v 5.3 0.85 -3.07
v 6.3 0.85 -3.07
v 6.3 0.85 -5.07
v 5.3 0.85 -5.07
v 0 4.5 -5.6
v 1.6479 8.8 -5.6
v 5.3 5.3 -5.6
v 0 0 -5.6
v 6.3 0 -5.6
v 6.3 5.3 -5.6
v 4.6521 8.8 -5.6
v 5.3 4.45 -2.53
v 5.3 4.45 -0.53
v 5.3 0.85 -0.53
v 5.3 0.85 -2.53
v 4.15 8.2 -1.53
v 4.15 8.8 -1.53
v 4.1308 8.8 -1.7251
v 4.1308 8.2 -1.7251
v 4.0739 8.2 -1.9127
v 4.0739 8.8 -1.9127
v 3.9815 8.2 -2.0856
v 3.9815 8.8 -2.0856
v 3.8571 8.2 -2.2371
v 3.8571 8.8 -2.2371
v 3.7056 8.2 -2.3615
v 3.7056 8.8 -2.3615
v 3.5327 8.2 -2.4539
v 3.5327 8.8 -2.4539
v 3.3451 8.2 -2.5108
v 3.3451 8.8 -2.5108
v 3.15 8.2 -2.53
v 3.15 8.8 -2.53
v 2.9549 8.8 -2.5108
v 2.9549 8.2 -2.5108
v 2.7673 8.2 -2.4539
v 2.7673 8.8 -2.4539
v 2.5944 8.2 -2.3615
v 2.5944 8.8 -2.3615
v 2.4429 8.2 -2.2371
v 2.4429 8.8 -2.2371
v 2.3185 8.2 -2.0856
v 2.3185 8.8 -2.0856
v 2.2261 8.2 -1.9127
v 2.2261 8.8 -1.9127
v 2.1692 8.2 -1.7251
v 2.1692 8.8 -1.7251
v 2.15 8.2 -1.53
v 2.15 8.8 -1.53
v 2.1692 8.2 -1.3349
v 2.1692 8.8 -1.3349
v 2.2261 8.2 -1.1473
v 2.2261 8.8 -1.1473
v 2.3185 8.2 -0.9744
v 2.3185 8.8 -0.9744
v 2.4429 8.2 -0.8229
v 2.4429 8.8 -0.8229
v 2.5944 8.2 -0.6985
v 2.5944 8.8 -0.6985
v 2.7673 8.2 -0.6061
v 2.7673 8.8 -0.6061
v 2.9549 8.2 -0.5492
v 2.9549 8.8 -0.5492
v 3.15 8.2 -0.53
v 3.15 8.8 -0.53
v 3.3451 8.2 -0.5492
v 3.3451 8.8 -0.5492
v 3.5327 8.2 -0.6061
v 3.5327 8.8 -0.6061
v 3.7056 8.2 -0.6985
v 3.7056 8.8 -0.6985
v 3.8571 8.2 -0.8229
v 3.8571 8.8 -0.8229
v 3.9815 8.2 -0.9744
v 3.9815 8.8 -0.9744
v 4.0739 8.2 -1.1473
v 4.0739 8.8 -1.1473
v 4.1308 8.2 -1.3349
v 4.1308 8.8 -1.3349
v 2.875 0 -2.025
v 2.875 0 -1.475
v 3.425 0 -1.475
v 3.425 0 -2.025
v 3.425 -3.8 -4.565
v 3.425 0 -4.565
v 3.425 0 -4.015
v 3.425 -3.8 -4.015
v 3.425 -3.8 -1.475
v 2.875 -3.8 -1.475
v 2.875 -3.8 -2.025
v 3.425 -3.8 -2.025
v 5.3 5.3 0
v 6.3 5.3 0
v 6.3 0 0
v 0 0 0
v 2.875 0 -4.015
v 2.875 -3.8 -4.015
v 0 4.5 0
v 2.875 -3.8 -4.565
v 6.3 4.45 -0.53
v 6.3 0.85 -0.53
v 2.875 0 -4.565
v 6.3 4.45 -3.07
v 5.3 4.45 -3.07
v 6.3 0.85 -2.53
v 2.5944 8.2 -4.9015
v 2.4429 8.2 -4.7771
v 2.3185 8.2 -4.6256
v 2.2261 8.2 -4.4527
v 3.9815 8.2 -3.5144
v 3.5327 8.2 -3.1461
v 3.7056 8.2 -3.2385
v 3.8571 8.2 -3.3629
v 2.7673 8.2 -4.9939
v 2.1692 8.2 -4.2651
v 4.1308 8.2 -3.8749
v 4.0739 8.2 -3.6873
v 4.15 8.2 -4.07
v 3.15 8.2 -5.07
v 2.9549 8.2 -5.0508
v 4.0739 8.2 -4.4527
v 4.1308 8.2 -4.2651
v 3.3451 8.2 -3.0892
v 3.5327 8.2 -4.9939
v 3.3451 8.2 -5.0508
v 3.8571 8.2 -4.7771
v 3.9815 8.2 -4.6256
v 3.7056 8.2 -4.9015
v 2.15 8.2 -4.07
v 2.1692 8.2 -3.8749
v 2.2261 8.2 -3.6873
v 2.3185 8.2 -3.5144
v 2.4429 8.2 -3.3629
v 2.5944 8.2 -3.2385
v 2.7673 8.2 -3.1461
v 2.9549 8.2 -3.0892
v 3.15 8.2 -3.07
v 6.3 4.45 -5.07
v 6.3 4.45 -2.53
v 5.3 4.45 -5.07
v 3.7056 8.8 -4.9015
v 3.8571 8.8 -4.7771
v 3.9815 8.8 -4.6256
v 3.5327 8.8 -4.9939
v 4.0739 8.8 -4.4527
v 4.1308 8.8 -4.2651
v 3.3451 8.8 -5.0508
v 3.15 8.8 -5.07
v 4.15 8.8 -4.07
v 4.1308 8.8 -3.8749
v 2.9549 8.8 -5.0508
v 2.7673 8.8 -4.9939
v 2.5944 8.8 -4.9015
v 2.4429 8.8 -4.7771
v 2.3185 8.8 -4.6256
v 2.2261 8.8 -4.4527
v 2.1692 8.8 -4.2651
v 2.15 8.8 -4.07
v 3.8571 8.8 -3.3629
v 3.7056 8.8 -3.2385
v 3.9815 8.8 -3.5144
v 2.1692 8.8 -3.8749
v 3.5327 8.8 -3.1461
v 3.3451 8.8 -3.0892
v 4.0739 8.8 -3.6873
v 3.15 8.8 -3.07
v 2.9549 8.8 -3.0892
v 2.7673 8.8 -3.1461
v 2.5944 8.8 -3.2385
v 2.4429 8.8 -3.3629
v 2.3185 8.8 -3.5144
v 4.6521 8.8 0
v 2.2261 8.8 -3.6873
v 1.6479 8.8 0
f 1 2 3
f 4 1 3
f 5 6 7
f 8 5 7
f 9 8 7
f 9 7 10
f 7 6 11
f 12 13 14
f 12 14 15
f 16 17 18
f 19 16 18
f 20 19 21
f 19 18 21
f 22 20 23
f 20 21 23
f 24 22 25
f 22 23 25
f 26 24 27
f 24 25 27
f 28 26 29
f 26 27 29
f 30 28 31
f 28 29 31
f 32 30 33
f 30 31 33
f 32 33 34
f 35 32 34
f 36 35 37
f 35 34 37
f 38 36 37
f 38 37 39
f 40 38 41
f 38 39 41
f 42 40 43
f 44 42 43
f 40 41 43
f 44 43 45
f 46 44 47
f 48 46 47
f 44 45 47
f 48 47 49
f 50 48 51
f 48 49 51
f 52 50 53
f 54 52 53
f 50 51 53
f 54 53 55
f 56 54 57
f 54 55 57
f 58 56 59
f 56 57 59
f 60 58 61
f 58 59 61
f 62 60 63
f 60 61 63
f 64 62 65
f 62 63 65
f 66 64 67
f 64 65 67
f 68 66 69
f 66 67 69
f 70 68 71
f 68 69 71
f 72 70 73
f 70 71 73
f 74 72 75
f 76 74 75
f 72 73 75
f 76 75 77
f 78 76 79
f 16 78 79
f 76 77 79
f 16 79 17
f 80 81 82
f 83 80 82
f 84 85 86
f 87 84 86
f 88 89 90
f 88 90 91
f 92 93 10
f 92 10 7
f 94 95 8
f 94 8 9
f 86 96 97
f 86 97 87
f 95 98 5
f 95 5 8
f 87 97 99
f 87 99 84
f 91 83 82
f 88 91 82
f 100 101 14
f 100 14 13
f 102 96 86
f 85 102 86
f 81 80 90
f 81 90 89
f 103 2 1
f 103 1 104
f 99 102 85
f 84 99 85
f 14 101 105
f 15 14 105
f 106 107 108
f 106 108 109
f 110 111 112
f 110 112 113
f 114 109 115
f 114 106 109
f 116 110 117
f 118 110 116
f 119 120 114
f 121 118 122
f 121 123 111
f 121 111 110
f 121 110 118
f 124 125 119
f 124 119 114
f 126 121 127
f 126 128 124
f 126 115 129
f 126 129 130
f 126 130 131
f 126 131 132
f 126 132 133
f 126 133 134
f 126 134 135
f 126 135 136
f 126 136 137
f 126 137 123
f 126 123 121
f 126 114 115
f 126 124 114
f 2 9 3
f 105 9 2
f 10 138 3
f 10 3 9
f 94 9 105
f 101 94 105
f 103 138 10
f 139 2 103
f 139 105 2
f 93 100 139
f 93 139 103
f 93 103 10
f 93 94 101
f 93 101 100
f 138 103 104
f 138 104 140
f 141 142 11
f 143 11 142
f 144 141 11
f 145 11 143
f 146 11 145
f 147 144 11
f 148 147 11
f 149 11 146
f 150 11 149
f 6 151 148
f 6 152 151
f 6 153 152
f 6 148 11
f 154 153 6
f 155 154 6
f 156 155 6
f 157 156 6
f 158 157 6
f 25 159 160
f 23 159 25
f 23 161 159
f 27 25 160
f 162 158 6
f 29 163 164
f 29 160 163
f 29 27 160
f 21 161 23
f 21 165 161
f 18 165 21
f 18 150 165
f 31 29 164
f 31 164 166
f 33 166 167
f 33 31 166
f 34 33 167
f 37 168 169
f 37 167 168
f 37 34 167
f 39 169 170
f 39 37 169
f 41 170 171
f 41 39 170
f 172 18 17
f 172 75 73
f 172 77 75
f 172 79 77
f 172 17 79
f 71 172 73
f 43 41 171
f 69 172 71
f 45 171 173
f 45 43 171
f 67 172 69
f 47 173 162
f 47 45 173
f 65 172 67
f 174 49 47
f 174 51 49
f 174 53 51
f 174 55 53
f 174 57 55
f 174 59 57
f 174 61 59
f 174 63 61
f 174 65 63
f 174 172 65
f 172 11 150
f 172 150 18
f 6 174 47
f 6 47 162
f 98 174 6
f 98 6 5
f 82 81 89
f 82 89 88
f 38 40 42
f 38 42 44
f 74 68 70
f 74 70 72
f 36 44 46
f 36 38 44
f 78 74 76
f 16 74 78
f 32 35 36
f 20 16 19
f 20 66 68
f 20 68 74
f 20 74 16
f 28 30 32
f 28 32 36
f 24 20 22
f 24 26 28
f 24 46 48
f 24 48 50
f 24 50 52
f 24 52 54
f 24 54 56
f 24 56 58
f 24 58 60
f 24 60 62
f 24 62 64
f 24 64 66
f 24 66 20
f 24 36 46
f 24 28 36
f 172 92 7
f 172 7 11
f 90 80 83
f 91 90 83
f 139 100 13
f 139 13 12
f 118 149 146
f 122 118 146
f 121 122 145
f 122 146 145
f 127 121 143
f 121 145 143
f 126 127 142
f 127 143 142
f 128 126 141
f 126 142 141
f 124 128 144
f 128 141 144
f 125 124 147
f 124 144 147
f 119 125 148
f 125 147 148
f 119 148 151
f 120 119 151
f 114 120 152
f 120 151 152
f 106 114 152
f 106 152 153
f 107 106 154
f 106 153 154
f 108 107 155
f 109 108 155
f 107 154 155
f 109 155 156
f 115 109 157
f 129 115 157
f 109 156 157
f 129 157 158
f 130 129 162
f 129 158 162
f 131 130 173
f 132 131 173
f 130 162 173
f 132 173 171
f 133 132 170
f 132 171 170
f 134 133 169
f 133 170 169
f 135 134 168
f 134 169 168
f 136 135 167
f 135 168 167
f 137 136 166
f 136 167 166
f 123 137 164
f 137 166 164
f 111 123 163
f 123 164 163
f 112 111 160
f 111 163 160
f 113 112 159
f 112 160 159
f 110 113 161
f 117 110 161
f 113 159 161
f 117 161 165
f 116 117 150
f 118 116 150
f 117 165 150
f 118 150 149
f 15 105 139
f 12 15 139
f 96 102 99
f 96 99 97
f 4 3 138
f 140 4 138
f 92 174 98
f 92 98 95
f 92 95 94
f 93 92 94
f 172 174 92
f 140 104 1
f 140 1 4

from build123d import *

# Parameters (mm, degrees)
BOSS_EXTRUDE1_DEPTH   = 5.6
SKETCH3_R             = 1
CUT_EXTRUDE1_DEPTH    = 0.6
SKETCH4_W             = 2
SKETCH4_H             = 3.6
CUT_EXTRUDE2_DEPTH    = 1
SKETCH5_W             = 0.55
SKETCH5_H             = 0.55
BOSS_EXTRUDE2_DEPTH   = 3.8
BOSS_EXTRUDE2_2_DEPTH = 3.8


with BuildPart() as part:
    # Sketch2 → Boss-Extrude1 (new body)
    with BuildSketch(Plane.XY):
        Polygon((6.3, 5.3), (5.3, 5.3), (4.652088092, 8.8), (1.647911908, 8.8), (0, 4.5), (0, 0), (6.3, 0), align=None)
    extrude(amount=-BOSS_EXTRUDE1_DEPTH)

    # Sketch3 → Cut-Extrude1 (cut)
    with BuildSketch(Plane(origin=(0, 8.8, 0), x_dir=(1, 0, 0), z_dir=(0, 1, 0))):
        with Locations((3.15, 1.53)):
            Circle(SKETCH3_R)
        with Locations((3.15, 4.07)):
            Circle(SKETCH3_R)
    extrude(amount=-CUT_EXTRUDE1_DEPTH, mode=Mode.SUBTRACT)

    # Sketch4 → Cut-Extrude2 (cut)
    with BuildSketch(Plane(origin=(6.3, 0, 0), x_dir=(0, 0, -1), z_dir=(1, 0, 0))):
        with Locations((4.07, 2.65)):
            Rectangle(SKETCH4_W, SKETCH4_H)
        with Locations((1.53, 2.65)):
            Rectangle(SKETCH4_W, SKETCH4_H)
    extrude(amount=-CUT_EXTRUDE2_DEPTH, mode=Mode.SUBTRACT)


with BuildPart() as body_2:
    # Sketch5 → Boss-Extrude2 (new body)
    with BuildSketch(Plane.XZ):
        with Locations((3.15, -1.75)):
            Rectangle(SKETCH5_W, SKETCH5_H)
    extrude(amount=BOSS_EXTRUDE2_DEPTH)


with BuildPart() as body_3:
    # Sketch5 → Boss-Extrude2 2 (new body)
    with BuildSketch(Plane.XZ):
        with Locations((3.15, -4.29)):
            Rectangle(SKETCH5_W, SKETCH5_H)
    extrude(amount=BOSS_EXTRUDE2_2_DEPTH)


solid = Compound([part.part, body_2.part, body_3.part])
